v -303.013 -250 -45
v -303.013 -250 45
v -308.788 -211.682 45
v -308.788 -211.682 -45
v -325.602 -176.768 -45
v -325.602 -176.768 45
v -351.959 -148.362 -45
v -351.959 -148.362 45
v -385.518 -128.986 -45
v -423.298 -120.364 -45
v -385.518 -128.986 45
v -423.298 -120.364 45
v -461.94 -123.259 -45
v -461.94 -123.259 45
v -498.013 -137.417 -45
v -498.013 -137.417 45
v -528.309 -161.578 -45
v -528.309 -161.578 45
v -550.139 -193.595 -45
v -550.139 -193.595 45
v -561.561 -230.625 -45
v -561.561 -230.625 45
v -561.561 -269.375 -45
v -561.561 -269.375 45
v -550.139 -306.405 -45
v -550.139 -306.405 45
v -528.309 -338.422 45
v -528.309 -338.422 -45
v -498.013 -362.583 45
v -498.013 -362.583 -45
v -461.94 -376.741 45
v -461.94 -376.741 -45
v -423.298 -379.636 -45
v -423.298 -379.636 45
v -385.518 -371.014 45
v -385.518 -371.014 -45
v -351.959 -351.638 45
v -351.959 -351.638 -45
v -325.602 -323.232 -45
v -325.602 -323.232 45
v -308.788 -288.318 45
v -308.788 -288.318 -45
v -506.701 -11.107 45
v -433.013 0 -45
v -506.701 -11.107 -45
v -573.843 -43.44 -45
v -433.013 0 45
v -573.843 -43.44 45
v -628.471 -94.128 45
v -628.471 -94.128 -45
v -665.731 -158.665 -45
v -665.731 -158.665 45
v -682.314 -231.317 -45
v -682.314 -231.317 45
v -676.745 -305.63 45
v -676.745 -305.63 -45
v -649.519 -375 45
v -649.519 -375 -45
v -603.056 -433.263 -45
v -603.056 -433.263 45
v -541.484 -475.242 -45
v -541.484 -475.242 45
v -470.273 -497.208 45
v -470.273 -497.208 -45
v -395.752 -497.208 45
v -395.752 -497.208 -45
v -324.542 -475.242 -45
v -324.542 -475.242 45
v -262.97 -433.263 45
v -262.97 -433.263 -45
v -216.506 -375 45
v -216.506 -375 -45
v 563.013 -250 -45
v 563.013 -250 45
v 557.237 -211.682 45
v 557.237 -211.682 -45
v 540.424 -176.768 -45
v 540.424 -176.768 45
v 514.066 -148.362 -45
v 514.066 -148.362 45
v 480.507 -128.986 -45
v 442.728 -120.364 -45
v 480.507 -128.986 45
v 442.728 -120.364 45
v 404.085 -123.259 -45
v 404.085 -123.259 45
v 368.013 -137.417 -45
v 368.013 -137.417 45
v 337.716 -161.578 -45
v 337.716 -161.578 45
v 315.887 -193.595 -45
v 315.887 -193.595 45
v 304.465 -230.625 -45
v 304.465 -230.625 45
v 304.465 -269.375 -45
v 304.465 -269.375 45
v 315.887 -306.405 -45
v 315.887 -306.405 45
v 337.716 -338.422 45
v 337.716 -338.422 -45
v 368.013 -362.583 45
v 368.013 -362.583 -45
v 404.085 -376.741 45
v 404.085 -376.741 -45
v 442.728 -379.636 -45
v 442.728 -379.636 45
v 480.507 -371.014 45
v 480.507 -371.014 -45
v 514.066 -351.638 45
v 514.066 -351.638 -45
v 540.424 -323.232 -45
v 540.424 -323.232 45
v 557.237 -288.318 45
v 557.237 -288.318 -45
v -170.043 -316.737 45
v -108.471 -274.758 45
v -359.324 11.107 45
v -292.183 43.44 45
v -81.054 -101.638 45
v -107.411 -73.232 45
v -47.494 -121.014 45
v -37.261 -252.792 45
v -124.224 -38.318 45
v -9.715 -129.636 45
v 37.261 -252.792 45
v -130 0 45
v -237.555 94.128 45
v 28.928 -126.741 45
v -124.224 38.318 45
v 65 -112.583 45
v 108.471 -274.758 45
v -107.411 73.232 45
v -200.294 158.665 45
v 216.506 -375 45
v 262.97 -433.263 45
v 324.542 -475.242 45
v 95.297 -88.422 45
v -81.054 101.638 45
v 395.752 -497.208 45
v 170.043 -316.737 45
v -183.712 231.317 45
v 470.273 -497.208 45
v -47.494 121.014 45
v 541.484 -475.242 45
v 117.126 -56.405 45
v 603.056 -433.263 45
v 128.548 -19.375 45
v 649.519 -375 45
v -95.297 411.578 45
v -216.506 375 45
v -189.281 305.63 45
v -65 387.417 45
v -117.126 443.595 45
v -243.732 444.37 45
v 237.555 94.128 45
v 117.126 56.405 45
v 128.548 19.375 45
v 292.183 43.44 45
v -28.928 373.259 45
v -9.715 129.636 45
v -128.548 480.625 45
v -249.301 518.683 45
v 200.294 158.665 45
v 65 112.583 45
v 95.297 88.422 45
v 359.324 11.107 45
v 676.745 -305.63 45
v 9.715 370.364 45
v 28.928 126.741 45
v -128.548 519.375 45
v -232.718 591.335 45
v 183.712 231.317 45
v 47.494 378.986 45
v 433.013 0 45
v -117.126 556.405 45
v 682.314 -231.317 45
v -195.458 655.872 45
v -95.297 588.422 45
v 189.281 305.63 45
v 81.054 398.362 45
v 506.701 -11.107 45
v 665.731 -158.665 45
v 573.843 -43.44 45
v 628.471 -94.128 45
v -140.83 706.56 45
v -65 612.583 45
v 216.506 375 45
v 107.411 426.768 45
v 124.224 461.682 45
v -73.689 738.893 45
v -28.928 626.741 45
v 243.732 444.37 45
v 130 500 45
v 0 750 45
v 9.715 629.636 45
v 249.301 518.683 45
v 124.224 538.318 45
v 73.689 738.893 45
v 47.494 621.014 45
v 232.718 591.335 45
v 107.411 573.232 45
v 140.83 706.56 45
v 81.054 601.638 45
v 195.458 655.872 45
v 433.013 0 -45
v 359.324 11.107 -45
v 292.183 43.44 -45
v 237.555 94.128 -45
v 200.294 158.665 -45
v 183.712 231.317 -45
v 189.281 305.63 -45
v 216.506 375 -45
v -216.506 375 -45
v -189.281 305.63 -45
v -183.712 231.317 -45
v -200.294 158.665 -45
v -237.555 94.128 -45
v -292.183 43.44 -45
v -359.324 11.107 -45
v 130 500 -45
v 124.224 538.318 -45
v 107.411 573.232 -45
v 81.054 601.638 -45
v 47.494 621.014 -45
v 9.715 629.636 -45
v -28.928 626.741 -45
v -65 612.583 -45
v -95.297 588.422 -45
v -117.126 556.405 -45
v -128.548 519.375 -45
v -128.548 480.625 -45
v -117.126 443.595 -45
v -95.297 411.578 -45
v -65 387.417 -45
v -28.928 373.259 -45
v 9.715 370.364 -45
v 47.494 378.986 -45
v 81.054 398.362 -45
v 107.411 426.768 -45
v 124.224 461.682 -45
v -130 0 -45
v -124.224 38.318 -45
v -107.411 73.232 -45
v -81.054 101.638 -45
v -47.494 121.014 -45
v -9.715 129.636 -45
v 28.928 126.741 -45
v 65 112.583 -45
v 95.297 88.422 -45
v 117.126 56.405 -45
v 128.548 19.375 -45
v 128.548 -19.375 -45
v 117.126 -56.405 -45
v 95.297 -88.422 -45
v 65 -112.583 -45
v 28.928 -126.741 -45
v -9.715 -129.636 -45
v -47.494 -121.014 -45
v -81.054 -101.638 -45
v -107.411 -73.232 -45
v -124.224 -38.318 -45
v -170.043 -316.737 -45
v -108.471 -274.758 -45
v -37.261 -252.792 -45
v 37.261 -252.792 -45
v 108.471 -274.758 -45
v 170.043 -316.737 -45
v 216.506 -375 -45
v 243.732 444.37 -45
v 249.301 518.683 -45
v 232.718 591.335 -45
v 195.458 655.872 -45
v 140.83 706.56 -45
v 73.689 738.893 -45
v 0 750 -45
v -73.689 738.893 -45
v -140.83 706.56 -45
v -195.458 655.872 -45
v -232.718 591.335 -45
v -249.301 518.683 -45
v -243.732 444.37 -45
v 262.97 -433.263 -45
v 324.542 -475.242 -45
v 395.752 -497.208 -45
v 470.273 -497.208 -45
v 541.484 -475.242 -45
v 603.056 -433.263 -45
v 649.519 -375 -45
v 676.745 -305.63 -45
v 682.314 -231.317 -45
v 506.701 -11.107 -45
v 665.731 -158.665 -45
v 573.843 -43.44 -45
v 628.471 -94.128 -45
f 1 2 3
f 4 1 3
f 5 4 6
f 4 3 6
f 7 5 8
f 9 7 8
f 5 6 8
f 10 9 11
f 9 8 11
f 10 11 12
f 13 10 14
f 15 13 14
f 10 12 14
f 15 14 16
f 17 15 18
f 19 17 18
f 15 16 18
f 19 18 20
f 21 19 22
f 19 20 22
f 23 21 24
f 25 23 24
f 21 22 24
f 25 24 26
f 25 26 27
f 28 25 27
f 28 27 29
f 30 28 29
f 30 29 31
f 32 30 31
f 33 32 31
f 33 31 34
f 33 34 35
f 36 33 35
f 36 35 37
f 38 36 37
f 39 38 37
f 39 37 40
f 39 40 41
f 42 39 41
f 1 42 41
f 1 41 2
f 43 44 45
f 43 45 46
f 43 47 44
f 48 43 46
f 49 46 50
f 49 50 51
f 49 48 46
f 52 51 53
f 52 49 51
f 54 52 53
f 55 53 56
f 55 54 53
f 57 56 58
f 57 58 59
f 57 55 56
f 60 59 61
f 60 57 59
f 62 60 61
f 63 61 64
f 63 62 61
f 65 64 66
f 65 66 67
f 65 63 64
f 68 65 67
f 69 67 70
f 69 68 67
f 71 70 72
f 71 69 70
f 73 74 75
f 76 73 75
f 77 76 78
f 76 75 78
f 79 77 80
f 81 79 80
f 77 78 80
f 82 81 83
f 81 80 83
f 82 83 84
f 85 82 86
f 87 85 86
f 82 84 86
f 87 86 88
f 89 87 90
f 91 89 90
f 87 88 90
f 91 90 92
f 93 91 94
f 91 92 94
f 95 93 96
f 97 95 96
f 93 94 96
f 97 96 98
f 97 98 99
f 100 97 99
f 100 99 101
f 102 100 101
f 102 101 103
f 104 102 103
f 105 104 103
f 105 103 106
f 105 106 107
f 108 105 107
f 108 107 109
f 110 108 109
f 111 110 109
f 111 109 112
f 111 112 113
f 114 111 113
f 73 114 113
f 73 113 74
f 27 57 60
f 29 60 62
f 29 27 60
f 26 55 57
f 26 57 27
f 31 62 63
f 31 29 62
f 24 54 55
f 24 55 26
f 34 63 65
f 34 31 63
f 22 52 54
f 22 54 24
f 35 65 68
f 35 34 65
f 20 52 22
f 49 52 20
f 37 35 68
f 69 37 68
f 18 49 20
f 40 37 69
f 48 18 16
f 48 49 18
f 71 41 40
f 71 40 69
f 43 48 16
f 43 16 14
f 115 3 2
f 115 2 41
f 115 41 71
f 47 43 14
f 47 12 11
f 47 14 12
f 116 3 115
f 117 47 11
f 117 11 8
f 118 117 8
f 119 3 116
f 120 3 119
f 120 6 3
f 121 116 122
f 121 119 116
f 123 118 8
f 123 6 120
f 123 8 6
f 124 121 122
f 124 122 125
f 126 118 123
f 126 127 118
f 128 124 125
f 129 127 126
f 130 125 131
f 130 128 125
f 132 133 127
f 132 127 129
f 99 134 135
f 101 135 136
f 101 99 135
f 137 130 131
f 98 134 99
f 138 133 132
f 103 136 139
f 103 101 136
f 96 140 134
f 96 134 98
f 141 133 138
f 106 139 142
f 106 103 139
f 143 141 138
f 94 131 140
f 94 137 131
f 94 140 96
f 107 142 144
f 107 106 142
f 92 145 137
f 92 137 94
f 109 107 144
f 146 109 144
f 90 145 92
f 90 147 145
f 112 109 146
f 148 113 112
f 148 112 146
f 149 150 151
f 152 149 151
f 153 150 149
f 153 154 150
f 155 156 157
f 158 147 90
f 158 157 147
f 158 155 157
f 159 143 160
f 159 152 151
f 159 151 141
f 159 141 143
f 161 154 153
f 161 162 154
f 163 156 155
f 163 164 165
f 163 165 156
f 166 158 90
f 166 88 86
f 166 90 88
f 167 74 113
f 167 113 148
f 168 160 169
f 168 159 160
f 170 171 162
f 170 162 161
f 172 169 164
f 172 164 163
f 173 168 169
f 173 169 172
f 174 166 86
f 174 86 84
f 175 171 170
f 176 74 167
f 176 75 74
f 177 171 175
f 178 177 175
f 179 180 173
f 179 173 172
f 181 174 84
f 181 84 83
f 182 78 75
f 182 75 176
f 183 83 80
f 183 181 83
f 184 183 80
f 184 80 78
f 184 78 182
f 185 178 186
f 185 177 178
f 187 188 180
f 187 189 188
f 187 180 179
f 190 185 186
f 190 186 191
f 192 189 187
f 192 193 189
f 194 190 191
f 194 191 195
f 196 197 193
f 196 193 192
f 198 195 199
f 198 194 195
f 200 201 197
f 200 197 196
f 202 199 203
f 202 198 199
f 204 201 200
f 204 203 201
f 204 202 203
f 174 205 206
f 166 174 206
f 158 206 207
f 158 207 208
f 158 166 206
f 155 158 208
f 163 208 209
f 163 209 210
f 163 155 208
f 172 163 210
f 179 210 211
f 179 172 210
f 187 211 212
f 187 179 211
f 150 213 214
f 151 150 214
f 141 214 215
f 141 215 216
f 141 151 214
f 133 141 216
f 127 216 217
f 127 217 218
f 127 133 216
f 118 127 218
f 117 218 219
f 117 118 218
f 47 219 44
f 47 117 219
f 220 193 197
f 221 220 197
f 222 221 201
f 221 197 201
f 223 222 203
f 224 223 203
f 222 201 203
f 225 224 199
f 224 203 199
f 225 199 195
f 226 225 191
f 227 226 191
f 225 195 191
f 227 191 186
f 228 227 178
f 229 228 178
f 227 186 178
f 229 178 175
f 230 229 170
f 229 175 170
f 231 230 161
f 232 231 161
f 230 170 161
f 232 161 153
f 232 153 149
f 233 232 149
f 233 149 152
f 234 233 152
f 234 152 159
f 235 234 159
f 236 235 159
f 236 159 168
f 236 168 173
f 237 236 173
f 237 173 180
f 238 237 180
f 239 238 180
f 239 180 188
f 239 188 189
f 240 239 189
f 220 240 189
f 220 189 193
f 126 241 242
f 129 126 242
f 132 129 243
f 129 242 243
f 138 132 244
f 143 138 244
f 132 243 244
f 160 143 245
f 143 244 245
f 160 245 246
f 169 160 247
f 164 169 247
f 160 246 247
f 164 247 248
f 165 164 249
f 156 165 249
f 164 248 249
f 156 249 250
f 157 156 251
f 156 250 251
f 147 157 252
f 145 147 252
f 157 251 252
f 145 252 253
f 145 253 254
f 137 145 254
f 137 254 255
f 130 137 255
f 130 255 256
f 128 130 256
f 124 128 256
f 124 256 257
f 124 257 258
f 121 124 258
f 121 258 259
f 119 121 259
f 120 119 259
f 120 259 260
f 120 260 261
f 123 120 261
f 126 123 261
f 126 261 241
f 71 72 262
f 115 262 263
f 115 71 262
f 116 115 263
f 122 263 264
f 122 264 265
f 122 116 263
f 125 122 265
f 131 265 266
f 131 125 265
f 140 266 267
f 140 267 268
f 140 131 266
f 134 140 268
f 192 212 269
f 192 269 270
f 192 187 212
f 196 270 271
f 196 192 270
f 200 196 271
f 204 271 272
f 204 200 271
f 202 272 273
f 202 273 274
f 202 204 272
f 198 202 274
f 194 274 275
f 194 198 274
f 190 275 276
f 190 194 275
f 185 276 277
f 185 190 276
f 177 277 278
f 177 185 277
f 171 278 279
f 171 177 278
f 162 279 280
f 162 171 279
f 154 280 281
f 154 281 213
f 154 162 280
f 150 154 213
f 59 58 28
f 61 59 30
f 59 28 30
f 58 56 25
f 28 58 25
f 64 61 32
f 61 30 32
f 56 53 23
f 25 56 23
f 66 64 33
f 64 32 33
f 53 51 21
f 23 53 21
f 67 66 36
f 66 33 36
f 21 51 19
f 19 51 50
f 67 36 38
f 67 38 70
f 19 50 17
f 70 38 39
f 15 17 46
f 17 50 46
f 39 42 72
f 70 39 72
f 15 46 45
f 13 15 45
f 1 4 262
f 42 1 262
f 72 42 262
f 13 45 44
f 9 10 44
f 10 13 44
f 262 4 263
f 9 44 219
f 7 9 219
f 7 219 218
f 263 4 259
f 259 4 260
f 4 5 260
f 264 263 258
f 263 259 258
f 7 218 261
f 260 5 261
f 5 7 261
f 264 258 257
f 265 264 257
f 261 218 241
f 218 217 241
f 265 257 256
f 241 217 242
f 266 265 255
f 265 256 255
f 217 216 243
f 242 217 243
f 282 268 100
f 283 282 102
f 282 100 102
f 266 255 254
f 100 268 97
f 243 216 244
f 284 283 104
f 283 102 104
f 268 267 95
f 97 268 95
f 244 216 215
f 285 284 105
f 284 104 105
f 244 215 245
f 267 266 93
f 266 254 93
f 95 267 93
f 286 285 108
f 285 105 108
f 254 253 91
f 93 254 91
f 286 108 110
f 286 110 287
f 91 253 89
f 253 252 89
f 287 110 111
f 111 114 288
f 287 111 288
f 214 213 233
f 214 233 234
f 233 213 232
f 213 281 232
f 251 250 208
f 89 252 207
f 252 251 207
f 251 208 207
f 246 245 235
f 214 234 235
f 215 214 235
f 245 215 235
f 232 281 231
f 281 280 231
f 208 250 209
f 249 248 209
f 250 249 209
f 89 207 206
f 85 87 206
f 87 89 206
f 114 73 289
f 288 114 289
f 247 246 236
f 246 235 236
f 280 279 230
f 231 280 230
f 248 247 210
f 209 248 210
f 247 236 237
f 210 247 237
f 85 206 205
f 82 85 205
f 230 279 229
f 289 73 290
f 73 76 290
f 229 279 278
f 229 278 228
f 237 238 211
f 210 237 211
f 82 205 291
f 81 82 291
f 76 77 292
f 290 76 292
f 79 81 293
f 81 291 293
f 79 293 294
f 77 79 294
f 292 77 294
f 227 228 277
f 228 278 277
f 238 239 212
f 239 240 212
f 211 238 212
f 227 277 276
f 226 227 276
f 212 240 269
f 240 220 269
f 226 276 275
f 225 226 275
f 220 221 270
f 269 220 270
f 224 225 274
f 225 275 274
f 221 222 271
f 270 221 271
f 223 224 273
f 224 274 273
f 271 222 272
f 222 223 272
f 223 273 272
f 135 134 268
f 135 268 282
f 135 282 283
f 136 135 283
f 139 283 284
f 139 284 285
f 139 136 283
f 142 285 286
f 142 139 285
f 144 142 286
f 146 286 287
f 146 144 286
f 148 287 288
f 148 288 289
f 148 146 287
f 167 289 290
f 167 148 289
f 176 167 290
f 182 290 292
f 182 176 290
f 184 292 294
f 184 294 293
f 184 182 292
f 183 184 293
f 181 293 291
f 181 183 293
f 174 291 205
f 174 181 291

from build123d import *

# Parameters (mm, degrees)
BOSS_EXTRUDE1_DEPTH = 45
SKETCH3_R           = 130
CUT_EXTRUDE1_DEPTH  = 1019.38418632
SKETCH2_R           = 130
CUT_EXTRUDE2_DEPTH  = 1019.38418632


with BuildPart() as part:
    # Sketch1 → Boss-Extrude1 (new, symmetric)
    with BuildSketch(Plane.XY):
        with BuildLine():
            ThreePointArc((-433.012701892, 0), (-649.519052838, -375), (-216.506350946, -375))
            ThreePointArc((-216.506350946, -375), (0, -250), (216.506350946, -375))
            ThreePointArc((216.506350946, -375), (649.519052838, -375), (433.012701892, 0))
            ThreePointArc((433.012701892, 0), (216.506350946, 125), (216.506350946, 375))
            ThreePointArc((216.506350946, 375), (0, 750), (-216.506350946, 375))
            ThreePointArc((-216.506350946, 375), (-216.506350946, 125), (-433.012701892, 0))
        make_face()
    extrude(amount=BOSS_EXTRUDE1_DEPTH, both=True)

    # Sketch3 → Cut-Extrude1 (cut, through all)
    with BuildSketch(Plane(origin=(0, 0, -45), x_dir=(-1, 0, 0), z_dir=(0, 0, -1))):
        Circle(SKETCH3_R)
    extrude(amount=-CUT_EXTRUDE1_DEPTH, mode=Mode.SUBTRACT)

    # Sketch2 → Cut-Extrude2 (cut, through all)
    with BuildSketch(Plane.XY.offset(45)):
        with Locations((-433.012701892, -250)):
            Circle(SKETCH2_R)
        with Locations((433.012701892, -250)):
            Circle(SKETCH2_R)
        with Locations((0, 500)):
            Circle(SKETCH2_R)
    extrude(amount=-CUT_EXTRUDE2_DEPTH, mode=Mode.SUBTRACT)


solid = part.part
